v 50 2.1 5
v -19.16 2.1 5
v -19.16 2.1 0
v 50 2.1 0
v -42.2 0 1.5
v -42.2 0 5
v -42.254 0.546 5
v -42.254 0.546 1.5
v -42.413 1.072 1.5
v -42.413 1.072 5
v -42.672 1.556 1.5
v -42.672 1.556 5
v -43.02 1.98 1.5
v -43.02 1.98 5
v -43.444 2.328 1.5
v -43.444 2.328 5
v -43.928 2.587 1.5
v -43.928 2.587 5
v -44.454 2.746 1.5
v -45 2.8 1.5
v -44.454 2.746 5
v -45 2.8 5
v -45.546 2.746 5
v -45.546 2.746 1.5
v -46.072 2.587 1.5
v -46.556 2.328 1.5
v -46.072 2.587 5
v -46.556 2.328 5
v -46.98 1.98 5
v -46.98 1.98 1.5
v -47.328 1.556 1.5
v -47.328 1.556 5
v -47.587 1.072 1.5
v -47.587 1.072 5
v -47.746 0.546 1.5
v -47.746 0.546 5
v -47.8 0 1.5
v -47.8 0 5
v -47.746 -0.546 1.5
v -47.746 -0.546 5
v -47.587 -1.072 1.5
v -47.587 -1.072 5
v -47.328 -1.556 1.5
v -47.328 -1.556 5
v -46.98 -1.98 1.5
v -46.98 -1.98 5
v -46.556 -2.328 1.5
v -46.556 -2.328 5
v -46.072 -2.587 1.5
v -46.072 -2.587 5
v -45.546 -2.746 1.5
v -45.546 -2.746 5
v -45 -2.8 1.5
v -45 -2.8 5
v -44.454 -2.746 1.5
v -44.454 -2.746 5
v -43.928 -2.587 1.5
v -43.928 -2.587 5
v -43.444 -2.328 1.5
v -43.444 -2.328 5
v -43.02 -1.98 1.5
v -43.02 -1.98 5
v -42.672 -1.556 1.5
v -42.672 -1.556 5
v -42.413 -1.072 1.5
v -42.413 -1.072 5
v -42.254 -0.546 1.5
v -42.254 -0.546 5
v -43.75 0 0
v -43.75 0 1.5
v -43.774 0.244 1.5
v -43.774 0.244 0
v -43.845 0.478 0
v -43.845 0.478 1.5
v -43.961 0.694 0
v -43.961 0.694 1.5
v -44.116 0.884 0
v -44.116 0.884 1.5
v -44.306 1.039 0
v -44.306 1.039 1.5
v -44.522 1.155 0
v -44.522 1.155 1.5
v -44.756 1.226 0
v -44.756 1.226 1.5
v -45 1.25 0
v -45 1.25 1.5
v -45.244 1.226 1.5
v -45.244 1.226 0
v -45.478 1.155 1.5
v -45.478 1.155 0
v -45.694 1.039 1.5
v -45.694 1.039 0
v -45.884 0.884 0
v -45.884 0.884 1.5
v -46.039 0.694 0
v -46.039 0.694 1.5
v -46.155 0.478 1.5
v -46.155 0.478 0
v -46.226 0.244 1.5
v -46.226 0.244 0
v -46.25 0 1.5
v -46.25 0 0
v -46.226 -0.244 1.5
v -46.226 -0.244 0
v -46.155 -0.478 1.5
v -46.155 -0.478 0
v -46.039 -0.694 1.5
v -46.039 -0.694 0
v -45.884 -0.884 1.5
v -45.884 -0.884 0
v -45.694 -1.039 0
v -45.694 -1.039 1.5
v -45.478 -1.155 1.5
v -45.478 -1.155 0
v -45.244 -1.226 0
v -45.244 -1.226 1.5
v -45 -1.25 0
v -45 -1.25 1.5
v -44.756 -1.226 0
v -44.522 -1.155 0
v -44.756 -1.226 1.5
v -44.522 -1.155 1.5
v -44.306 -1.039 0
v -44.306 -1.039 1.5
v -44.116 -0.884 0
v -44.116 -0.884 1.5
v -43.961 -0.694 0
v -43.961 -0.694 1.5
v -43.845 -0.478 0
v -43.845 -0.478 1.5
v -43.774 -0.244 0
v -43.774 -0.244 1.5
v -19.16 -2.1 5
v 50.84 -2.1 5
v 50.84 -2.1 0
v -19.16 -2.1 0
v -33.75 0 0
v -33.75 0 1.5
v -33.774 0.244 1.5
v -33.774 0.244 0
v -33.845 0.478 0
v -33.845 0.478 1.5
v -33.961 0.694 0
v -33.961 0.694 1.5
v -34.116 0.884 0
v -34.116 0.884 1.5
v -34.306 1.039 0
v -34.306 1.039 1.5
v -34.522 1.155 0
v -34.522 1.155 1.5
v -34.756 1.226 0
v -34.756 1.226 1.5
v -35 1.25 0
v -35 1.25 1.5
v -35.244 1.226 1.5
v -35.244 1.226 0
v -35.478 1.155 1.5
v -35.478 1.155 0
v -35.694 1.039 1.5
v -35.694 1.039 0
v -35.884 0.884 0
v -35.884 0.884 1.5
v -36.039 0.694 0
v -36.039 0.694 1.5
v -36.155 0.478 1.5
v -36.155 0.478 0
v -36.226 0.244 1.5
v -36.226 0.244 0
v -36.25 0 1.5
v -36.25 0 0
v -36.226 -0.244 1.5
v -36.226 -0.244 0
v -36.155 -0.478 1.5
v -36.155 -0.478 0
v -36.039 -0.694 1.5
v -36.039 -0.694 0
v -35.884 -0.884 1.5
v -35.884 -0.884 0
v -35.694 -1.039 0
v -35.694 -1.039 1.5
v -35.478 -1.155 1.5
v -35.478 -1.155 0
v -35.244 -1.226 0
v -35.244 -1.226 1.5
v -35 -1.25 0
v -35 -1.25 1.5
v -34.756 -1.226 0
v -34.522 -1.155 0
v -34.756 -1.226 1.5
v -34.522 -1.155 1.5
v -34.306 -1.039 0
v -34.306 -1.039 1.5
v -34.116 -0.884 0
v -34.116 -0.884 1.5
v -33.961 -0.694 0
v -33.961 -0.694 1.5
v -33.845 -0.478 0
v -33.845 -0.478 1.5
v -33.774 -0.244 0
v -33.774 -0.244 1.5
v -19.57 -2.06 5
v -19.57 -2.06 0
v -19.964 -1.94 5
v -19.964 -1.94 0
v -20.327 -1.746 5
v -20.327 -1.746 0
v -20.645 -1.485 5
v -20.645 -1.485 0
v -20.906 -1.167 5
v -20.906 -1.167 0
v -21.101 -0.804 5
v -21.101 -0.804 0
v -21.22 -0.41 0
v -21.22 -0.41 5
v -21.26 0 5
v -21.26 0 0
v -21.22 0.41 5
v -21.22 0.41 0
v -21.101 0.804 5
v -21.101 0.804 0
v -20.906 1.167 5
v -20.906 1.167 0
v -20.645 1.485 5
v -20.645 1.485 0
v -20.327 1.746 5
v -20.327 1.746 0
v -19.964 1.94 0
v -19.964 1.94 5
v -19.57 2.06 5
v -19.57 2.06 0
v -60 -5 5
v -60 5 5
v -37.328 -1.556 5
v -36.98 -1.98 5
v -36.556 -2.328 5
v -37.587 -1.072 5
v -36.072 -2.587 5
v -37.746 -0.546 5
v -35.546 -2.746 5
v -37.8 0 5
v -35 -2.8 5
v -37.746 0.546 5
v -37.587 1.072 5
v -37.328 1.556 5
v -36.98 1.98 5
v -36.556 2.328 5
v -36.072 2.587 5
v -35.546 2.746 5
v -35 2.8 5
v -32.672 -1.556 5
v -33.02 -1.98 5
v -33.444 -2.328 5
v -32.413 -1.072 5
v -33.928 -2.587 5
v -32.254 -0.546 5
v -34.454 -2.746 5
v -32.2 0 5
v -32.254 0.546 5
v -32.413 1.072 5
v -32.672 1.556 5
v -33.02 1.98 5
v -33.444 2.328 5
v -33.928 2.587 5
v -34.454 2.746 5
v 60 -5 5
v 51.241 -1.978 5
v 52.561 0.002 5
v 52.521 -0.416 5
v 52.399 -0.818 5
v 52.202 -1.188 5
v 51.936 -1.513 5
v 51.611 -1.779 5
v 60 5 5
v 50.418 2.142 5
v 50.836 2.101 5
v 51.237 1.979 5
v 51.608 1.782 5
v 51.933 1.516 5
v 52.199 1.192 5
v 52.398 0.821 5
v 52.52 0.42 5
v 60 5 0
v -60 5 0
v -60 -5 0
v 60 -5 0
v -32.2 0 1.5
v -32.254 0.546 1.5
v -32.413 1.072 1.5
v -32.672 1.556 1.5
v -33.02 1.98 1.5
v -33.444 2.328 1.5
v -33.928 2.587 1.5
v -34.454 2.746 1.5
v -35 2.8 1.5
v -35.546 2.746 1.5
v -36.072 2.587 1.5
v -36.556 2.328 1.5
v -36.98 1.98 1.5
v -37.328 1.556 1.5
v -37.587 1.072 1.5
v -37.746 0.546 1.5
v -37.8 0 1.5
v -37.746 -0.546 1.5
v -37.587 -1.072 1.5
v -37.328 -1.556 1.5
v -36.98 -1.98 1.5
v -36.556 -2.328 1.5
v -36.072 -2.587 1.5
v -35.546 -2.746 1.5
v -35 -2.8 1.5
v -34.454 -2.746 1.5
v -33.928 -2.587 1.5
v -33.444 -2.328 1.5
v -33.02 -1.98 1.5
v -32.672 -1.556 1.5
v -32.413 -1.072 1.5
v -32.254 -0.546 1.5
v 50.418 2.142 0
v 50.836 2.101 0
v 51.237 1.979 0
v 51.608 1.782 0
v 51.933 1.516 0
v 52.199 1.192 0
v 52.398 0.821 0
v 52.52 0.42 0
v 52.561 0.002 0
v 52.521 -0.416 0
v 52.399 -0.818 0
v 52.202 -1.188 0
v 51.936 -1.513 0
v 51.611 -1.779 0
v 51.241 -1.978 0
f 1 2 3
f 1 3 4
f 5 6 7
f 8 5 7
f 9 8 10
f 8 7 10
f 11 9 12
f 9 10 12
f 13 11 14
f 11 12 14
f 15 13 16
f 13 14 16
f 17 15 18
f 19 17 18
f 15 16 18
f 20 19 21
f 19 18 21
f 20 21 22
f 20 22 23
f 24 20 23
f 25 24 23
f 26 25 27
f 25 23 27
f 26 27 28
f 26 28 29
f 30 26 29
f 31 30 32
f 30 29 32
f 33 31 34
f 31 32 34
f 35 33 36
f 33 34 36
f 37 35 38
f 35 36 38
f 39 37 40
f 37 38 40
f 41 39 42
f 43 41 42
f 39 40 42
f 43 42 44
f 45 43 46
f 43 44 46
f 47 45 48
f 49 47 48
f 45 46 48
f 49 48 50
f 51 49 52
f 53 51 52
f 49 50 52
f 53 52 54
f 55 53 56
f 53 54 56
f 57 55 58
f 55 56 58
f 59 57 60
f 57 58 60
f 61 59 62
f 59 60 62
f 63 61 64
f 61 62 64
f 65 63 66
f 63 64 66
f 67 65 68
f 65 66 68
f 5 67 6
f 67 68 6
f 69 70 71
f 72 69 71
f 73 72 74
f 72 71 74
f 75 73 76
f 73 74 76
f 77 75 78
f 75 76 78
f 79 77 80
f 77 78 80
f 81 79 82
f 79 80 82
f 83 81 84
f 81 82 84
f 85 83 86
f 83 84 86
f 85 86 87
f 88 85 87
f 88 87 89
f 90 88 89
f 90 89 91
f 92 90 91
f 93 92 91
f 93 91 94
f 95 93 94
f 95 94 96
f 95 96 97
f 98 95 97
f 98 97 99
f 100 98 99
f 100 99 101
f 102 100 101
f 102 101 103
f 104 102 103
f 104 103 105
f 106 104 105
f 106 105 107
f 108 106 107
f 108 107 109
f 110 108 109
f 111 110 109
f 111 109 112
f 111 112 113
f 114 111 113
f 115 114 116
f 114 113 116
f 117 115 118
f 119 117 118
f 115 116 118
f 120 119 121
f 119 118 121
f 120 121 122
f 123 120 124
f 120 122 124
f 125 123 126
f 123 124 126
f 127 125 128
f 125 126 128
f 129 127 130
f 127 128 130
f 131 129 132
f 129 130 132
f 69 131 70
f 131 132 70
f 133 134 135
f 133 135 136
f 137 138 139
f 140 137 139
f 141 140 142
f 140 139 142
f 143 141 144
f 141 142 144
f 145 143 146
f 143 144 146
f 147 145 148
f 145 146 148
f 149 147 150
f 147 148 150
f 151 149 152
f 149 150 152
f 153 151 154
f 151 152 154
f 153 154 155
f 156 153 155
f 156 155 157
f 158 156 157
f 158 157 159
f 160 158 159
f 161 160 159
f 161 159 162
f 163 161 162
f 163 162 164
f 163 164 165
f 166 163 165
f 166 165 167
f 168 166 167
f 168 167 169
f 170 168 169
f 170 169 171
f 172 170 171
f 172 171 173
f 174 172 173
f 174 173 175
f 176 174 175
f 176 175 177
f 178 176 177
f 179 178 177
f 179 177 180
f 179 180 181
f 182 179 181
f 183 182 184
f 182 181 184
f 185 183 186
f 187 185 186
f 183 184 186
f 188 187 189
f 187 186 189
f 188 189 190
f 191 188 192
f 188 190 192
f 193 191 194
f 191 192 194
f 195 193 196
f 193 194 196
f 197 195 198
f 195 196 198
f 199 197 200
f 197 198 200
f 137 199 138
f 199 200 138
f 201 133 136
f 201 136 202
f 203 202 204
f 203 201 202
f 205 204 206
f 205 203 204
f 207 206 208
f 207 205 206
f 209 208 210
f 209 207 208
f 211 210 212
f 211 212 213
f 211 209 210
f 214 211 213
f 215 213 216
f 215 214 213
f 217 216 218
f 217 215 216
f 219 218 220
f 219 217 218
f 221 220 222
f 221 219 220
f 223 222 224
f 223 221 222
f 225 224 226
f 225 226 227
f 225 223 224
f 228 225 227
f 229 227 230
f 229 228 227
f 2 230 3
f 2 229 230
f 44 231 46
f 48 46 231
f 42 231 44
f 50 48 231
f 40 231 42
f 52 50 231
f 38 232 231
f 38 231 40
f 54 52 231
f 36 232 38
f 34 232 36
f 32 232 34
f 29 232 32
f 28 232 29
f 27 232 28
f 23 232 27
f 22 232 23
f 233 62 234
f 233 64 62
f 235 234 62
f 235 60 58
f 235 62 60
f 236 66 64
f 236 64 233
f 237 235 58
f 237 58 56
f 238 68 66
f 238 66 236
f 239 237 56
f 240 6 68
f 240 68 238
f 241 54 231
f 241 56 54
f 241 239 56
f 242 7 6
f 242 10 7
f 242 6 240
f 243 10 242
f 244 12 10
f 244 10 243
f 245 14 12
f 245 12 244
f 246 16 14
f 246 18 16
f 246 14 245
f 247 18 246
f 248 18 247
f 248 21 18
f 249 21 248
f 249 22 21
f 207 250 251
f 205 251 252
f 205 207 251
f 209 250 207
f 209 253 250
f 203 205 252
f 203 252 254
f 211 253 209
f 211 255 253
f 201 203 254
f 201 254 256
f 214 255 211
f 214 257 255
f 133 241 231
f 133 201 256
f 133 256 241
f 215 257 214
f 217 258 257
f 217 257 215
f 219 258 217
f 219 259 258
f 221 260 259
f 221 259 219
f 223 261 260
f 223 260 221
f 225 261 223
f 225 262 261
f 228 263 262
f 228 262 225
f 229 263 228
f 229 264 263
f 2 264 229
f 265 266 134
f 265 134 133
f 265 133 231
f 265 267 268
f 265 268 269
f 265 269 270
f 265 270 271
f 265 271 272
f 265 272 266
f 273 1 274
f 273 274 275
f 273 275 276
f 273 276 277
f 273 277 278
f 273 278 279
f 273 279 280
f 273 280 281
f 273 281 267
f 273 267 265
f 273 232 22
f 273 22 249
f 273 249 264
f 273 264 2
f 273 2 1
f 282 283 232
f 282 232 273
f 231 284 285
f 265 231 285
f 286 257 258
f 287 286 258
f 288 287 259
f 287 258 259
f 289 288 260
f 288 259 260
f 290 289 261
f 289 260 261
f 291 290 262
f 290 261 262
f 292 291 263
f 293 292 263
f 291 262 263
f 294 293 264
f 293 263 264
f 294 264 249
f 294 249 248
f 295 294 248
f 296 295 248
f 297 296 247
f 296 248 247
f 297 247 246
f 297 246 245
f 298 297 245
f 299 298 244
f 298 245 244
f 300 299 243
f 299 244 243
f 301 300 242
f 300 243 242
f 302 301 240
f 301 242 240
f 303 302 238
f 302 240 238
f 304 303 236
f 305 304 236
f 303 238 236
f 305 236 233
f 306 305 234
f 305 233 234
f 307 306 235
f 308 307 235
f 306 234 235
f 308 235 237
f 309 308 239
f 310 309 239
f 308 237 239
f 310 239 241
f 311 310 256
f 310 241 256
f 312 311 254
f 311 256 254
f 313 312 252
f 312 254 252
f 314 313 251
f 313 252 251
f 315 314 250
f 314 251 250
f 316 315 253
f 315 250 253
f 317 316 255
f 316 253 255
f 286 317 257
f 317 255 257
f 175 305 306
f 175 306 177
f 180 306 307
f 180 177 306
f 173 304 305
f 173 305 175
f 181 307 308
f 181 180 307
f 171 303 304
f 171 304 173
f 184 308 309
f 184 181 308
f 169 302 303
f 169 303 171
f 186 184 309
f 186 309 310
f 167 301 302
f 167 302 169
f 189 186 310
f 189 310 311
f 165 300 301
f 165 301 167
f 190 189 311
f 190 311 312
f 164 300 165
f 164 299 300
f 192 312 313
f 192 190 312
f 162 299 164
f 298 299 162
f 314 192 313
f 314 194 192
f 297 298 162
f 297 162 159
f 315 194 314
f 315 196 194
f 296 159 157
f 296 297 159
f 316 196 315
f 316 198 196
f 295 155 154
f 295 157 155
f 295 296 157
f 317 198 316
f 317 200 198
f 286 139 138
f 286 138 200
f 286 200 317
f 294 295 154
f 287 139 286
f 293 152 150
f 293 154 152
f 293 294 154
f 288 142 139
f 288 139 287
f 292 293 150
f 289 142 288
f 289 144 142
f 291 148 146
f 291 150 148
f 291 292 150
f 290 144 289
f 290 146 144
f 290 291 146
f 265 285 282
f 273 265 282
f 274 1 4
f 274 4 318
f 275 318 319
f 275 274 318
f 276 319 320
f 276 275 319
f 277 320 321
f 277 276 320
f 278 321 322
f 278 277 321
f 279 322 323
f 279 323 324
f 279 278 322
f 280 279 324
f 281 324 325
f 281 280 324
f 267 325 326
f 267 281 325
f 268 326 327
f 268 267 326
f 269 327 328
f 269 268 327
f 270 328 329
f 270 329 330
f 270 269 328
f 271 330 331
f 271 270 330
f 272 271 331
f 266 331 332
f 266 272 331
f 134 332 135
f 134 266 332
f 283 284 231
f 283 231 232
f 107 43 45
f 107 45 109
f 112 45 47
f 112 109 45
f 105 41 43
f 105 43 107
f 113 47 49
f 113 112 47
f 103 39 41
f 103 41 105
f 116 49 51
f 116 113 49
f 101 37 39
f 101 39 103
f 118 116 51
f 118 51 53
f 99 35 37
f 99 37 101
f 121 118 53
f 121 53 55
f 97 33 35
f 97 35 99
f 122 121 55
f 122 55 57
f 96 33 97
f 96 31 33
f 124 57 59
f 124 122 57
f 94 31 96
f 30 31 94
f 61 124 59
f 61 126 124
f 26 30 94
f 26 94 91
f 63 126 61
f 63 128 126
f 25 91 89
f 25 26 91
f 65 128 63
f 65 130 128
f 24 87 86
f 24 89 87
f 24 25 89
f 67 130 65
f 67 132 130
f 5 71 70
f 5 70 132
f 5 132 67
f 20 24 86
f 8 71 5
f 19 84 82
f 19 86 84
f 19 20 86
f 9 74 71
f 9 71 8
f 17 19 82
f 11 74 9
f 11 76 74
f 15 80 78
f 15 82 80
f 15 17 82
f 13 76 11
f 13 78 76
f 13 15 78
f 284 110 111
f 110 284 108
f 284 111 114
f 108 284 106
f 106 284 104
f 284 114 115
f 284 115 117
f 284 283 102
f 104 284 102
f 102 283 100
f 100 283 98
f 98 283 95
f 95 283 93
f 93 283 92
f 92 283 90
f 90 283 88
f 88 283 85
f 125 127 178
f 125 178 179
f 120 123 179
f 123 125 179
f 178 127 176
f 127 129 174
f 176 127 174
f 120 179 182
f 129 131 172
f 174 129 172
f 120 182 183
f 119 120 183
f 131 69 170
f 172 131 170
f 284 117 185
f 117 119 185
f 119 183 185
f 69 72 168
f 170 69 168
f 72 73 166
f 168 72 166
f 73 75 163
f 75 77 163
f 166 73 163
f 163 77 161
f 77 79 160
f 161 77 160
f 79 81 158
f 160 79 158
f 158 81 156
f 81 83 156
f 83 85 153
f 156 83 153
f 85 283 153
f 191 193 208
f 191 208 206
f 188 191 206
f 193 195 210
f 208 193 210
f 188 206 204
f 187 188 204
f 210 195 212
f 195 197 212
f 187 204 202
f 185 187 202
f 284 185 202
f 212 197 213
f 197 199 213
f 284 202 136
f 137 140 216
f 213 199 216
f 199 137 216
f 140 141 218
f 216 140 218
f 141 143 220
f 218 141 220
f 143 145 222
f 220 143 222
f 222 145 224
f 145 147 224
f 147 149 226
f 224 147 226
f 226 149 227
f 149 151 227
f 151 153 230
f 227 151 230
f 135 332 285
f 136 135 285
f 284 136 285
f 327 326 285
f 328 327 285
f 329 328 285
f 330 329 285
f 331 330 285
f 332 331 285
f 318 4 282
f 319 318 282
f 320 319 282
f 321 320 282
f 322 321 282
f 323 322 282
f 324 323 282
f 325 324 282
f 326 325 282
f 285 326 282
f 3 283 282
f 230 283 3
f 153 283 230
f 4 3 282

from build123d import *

# Parameters (mm, degrees)
SKETCH_1_W          = 120
SKETCH_1_H          = 10
EXTRUDE_1_DEPTH     = 5
SKETCH_2_R          = 1.25
CUT_EXTRUDE_1_DEPTH = 5
SKETCH_3_R          = 2.8
CUT_EXTRUDE_2_DEPTH = 3.5


with BuildPart() as part:
    # Эскиз1 → Бобышка-Вытянуть1 (new body)
    with BuildSketch(Plane.XY):
        Rectangle(SKETCH_1_W, SKETCH_1_H)
    extrude(amount=EXTRUDE_1_DEPTH)

    # Эскиз2 → Вырез-Вытянуть1 (cut)
    with BuildSketch(Plane.XY.offset(5)):
        with Locations((-45, 0)):
            Circle(SKETCH_2_R)
        with Locations((-35, 0)):
            Circle(SKETCH_2_R)
        with BuildLine():
            Line((-19.160353307, 2.1), (50, 2.1))
            ThreePointArc((50, 2.1), (52.519823346, 0.419823346), (50.839646693, -2.1))
            Line((50.839646693, -2.1), (-19.160353307, -2.1))
            ThreePointArc((-19.160353307, -2.1), (-21.260353307, 0), (-19.160353307, 2.1))
        make_face()
    extrude(amount=-CUT_EXTRUDE_1_DEPTH, mode=Mode.SUBTRACT)

    # Эскиз3 → Вырез-Вытянуть2 (cut)
    with BuildSketch(Plane.XY.offset(5)):
        with Locations((-45, 0)):
            Circle(SKETCH_3_R)
        with Locations((-35, 0)):
            Circle(SKETCH_3_R)
    extrude(amount=-CUT_EXTRUDE_2_DEPTH, mode=Mode.SUBTRACT)


solid = part.part
